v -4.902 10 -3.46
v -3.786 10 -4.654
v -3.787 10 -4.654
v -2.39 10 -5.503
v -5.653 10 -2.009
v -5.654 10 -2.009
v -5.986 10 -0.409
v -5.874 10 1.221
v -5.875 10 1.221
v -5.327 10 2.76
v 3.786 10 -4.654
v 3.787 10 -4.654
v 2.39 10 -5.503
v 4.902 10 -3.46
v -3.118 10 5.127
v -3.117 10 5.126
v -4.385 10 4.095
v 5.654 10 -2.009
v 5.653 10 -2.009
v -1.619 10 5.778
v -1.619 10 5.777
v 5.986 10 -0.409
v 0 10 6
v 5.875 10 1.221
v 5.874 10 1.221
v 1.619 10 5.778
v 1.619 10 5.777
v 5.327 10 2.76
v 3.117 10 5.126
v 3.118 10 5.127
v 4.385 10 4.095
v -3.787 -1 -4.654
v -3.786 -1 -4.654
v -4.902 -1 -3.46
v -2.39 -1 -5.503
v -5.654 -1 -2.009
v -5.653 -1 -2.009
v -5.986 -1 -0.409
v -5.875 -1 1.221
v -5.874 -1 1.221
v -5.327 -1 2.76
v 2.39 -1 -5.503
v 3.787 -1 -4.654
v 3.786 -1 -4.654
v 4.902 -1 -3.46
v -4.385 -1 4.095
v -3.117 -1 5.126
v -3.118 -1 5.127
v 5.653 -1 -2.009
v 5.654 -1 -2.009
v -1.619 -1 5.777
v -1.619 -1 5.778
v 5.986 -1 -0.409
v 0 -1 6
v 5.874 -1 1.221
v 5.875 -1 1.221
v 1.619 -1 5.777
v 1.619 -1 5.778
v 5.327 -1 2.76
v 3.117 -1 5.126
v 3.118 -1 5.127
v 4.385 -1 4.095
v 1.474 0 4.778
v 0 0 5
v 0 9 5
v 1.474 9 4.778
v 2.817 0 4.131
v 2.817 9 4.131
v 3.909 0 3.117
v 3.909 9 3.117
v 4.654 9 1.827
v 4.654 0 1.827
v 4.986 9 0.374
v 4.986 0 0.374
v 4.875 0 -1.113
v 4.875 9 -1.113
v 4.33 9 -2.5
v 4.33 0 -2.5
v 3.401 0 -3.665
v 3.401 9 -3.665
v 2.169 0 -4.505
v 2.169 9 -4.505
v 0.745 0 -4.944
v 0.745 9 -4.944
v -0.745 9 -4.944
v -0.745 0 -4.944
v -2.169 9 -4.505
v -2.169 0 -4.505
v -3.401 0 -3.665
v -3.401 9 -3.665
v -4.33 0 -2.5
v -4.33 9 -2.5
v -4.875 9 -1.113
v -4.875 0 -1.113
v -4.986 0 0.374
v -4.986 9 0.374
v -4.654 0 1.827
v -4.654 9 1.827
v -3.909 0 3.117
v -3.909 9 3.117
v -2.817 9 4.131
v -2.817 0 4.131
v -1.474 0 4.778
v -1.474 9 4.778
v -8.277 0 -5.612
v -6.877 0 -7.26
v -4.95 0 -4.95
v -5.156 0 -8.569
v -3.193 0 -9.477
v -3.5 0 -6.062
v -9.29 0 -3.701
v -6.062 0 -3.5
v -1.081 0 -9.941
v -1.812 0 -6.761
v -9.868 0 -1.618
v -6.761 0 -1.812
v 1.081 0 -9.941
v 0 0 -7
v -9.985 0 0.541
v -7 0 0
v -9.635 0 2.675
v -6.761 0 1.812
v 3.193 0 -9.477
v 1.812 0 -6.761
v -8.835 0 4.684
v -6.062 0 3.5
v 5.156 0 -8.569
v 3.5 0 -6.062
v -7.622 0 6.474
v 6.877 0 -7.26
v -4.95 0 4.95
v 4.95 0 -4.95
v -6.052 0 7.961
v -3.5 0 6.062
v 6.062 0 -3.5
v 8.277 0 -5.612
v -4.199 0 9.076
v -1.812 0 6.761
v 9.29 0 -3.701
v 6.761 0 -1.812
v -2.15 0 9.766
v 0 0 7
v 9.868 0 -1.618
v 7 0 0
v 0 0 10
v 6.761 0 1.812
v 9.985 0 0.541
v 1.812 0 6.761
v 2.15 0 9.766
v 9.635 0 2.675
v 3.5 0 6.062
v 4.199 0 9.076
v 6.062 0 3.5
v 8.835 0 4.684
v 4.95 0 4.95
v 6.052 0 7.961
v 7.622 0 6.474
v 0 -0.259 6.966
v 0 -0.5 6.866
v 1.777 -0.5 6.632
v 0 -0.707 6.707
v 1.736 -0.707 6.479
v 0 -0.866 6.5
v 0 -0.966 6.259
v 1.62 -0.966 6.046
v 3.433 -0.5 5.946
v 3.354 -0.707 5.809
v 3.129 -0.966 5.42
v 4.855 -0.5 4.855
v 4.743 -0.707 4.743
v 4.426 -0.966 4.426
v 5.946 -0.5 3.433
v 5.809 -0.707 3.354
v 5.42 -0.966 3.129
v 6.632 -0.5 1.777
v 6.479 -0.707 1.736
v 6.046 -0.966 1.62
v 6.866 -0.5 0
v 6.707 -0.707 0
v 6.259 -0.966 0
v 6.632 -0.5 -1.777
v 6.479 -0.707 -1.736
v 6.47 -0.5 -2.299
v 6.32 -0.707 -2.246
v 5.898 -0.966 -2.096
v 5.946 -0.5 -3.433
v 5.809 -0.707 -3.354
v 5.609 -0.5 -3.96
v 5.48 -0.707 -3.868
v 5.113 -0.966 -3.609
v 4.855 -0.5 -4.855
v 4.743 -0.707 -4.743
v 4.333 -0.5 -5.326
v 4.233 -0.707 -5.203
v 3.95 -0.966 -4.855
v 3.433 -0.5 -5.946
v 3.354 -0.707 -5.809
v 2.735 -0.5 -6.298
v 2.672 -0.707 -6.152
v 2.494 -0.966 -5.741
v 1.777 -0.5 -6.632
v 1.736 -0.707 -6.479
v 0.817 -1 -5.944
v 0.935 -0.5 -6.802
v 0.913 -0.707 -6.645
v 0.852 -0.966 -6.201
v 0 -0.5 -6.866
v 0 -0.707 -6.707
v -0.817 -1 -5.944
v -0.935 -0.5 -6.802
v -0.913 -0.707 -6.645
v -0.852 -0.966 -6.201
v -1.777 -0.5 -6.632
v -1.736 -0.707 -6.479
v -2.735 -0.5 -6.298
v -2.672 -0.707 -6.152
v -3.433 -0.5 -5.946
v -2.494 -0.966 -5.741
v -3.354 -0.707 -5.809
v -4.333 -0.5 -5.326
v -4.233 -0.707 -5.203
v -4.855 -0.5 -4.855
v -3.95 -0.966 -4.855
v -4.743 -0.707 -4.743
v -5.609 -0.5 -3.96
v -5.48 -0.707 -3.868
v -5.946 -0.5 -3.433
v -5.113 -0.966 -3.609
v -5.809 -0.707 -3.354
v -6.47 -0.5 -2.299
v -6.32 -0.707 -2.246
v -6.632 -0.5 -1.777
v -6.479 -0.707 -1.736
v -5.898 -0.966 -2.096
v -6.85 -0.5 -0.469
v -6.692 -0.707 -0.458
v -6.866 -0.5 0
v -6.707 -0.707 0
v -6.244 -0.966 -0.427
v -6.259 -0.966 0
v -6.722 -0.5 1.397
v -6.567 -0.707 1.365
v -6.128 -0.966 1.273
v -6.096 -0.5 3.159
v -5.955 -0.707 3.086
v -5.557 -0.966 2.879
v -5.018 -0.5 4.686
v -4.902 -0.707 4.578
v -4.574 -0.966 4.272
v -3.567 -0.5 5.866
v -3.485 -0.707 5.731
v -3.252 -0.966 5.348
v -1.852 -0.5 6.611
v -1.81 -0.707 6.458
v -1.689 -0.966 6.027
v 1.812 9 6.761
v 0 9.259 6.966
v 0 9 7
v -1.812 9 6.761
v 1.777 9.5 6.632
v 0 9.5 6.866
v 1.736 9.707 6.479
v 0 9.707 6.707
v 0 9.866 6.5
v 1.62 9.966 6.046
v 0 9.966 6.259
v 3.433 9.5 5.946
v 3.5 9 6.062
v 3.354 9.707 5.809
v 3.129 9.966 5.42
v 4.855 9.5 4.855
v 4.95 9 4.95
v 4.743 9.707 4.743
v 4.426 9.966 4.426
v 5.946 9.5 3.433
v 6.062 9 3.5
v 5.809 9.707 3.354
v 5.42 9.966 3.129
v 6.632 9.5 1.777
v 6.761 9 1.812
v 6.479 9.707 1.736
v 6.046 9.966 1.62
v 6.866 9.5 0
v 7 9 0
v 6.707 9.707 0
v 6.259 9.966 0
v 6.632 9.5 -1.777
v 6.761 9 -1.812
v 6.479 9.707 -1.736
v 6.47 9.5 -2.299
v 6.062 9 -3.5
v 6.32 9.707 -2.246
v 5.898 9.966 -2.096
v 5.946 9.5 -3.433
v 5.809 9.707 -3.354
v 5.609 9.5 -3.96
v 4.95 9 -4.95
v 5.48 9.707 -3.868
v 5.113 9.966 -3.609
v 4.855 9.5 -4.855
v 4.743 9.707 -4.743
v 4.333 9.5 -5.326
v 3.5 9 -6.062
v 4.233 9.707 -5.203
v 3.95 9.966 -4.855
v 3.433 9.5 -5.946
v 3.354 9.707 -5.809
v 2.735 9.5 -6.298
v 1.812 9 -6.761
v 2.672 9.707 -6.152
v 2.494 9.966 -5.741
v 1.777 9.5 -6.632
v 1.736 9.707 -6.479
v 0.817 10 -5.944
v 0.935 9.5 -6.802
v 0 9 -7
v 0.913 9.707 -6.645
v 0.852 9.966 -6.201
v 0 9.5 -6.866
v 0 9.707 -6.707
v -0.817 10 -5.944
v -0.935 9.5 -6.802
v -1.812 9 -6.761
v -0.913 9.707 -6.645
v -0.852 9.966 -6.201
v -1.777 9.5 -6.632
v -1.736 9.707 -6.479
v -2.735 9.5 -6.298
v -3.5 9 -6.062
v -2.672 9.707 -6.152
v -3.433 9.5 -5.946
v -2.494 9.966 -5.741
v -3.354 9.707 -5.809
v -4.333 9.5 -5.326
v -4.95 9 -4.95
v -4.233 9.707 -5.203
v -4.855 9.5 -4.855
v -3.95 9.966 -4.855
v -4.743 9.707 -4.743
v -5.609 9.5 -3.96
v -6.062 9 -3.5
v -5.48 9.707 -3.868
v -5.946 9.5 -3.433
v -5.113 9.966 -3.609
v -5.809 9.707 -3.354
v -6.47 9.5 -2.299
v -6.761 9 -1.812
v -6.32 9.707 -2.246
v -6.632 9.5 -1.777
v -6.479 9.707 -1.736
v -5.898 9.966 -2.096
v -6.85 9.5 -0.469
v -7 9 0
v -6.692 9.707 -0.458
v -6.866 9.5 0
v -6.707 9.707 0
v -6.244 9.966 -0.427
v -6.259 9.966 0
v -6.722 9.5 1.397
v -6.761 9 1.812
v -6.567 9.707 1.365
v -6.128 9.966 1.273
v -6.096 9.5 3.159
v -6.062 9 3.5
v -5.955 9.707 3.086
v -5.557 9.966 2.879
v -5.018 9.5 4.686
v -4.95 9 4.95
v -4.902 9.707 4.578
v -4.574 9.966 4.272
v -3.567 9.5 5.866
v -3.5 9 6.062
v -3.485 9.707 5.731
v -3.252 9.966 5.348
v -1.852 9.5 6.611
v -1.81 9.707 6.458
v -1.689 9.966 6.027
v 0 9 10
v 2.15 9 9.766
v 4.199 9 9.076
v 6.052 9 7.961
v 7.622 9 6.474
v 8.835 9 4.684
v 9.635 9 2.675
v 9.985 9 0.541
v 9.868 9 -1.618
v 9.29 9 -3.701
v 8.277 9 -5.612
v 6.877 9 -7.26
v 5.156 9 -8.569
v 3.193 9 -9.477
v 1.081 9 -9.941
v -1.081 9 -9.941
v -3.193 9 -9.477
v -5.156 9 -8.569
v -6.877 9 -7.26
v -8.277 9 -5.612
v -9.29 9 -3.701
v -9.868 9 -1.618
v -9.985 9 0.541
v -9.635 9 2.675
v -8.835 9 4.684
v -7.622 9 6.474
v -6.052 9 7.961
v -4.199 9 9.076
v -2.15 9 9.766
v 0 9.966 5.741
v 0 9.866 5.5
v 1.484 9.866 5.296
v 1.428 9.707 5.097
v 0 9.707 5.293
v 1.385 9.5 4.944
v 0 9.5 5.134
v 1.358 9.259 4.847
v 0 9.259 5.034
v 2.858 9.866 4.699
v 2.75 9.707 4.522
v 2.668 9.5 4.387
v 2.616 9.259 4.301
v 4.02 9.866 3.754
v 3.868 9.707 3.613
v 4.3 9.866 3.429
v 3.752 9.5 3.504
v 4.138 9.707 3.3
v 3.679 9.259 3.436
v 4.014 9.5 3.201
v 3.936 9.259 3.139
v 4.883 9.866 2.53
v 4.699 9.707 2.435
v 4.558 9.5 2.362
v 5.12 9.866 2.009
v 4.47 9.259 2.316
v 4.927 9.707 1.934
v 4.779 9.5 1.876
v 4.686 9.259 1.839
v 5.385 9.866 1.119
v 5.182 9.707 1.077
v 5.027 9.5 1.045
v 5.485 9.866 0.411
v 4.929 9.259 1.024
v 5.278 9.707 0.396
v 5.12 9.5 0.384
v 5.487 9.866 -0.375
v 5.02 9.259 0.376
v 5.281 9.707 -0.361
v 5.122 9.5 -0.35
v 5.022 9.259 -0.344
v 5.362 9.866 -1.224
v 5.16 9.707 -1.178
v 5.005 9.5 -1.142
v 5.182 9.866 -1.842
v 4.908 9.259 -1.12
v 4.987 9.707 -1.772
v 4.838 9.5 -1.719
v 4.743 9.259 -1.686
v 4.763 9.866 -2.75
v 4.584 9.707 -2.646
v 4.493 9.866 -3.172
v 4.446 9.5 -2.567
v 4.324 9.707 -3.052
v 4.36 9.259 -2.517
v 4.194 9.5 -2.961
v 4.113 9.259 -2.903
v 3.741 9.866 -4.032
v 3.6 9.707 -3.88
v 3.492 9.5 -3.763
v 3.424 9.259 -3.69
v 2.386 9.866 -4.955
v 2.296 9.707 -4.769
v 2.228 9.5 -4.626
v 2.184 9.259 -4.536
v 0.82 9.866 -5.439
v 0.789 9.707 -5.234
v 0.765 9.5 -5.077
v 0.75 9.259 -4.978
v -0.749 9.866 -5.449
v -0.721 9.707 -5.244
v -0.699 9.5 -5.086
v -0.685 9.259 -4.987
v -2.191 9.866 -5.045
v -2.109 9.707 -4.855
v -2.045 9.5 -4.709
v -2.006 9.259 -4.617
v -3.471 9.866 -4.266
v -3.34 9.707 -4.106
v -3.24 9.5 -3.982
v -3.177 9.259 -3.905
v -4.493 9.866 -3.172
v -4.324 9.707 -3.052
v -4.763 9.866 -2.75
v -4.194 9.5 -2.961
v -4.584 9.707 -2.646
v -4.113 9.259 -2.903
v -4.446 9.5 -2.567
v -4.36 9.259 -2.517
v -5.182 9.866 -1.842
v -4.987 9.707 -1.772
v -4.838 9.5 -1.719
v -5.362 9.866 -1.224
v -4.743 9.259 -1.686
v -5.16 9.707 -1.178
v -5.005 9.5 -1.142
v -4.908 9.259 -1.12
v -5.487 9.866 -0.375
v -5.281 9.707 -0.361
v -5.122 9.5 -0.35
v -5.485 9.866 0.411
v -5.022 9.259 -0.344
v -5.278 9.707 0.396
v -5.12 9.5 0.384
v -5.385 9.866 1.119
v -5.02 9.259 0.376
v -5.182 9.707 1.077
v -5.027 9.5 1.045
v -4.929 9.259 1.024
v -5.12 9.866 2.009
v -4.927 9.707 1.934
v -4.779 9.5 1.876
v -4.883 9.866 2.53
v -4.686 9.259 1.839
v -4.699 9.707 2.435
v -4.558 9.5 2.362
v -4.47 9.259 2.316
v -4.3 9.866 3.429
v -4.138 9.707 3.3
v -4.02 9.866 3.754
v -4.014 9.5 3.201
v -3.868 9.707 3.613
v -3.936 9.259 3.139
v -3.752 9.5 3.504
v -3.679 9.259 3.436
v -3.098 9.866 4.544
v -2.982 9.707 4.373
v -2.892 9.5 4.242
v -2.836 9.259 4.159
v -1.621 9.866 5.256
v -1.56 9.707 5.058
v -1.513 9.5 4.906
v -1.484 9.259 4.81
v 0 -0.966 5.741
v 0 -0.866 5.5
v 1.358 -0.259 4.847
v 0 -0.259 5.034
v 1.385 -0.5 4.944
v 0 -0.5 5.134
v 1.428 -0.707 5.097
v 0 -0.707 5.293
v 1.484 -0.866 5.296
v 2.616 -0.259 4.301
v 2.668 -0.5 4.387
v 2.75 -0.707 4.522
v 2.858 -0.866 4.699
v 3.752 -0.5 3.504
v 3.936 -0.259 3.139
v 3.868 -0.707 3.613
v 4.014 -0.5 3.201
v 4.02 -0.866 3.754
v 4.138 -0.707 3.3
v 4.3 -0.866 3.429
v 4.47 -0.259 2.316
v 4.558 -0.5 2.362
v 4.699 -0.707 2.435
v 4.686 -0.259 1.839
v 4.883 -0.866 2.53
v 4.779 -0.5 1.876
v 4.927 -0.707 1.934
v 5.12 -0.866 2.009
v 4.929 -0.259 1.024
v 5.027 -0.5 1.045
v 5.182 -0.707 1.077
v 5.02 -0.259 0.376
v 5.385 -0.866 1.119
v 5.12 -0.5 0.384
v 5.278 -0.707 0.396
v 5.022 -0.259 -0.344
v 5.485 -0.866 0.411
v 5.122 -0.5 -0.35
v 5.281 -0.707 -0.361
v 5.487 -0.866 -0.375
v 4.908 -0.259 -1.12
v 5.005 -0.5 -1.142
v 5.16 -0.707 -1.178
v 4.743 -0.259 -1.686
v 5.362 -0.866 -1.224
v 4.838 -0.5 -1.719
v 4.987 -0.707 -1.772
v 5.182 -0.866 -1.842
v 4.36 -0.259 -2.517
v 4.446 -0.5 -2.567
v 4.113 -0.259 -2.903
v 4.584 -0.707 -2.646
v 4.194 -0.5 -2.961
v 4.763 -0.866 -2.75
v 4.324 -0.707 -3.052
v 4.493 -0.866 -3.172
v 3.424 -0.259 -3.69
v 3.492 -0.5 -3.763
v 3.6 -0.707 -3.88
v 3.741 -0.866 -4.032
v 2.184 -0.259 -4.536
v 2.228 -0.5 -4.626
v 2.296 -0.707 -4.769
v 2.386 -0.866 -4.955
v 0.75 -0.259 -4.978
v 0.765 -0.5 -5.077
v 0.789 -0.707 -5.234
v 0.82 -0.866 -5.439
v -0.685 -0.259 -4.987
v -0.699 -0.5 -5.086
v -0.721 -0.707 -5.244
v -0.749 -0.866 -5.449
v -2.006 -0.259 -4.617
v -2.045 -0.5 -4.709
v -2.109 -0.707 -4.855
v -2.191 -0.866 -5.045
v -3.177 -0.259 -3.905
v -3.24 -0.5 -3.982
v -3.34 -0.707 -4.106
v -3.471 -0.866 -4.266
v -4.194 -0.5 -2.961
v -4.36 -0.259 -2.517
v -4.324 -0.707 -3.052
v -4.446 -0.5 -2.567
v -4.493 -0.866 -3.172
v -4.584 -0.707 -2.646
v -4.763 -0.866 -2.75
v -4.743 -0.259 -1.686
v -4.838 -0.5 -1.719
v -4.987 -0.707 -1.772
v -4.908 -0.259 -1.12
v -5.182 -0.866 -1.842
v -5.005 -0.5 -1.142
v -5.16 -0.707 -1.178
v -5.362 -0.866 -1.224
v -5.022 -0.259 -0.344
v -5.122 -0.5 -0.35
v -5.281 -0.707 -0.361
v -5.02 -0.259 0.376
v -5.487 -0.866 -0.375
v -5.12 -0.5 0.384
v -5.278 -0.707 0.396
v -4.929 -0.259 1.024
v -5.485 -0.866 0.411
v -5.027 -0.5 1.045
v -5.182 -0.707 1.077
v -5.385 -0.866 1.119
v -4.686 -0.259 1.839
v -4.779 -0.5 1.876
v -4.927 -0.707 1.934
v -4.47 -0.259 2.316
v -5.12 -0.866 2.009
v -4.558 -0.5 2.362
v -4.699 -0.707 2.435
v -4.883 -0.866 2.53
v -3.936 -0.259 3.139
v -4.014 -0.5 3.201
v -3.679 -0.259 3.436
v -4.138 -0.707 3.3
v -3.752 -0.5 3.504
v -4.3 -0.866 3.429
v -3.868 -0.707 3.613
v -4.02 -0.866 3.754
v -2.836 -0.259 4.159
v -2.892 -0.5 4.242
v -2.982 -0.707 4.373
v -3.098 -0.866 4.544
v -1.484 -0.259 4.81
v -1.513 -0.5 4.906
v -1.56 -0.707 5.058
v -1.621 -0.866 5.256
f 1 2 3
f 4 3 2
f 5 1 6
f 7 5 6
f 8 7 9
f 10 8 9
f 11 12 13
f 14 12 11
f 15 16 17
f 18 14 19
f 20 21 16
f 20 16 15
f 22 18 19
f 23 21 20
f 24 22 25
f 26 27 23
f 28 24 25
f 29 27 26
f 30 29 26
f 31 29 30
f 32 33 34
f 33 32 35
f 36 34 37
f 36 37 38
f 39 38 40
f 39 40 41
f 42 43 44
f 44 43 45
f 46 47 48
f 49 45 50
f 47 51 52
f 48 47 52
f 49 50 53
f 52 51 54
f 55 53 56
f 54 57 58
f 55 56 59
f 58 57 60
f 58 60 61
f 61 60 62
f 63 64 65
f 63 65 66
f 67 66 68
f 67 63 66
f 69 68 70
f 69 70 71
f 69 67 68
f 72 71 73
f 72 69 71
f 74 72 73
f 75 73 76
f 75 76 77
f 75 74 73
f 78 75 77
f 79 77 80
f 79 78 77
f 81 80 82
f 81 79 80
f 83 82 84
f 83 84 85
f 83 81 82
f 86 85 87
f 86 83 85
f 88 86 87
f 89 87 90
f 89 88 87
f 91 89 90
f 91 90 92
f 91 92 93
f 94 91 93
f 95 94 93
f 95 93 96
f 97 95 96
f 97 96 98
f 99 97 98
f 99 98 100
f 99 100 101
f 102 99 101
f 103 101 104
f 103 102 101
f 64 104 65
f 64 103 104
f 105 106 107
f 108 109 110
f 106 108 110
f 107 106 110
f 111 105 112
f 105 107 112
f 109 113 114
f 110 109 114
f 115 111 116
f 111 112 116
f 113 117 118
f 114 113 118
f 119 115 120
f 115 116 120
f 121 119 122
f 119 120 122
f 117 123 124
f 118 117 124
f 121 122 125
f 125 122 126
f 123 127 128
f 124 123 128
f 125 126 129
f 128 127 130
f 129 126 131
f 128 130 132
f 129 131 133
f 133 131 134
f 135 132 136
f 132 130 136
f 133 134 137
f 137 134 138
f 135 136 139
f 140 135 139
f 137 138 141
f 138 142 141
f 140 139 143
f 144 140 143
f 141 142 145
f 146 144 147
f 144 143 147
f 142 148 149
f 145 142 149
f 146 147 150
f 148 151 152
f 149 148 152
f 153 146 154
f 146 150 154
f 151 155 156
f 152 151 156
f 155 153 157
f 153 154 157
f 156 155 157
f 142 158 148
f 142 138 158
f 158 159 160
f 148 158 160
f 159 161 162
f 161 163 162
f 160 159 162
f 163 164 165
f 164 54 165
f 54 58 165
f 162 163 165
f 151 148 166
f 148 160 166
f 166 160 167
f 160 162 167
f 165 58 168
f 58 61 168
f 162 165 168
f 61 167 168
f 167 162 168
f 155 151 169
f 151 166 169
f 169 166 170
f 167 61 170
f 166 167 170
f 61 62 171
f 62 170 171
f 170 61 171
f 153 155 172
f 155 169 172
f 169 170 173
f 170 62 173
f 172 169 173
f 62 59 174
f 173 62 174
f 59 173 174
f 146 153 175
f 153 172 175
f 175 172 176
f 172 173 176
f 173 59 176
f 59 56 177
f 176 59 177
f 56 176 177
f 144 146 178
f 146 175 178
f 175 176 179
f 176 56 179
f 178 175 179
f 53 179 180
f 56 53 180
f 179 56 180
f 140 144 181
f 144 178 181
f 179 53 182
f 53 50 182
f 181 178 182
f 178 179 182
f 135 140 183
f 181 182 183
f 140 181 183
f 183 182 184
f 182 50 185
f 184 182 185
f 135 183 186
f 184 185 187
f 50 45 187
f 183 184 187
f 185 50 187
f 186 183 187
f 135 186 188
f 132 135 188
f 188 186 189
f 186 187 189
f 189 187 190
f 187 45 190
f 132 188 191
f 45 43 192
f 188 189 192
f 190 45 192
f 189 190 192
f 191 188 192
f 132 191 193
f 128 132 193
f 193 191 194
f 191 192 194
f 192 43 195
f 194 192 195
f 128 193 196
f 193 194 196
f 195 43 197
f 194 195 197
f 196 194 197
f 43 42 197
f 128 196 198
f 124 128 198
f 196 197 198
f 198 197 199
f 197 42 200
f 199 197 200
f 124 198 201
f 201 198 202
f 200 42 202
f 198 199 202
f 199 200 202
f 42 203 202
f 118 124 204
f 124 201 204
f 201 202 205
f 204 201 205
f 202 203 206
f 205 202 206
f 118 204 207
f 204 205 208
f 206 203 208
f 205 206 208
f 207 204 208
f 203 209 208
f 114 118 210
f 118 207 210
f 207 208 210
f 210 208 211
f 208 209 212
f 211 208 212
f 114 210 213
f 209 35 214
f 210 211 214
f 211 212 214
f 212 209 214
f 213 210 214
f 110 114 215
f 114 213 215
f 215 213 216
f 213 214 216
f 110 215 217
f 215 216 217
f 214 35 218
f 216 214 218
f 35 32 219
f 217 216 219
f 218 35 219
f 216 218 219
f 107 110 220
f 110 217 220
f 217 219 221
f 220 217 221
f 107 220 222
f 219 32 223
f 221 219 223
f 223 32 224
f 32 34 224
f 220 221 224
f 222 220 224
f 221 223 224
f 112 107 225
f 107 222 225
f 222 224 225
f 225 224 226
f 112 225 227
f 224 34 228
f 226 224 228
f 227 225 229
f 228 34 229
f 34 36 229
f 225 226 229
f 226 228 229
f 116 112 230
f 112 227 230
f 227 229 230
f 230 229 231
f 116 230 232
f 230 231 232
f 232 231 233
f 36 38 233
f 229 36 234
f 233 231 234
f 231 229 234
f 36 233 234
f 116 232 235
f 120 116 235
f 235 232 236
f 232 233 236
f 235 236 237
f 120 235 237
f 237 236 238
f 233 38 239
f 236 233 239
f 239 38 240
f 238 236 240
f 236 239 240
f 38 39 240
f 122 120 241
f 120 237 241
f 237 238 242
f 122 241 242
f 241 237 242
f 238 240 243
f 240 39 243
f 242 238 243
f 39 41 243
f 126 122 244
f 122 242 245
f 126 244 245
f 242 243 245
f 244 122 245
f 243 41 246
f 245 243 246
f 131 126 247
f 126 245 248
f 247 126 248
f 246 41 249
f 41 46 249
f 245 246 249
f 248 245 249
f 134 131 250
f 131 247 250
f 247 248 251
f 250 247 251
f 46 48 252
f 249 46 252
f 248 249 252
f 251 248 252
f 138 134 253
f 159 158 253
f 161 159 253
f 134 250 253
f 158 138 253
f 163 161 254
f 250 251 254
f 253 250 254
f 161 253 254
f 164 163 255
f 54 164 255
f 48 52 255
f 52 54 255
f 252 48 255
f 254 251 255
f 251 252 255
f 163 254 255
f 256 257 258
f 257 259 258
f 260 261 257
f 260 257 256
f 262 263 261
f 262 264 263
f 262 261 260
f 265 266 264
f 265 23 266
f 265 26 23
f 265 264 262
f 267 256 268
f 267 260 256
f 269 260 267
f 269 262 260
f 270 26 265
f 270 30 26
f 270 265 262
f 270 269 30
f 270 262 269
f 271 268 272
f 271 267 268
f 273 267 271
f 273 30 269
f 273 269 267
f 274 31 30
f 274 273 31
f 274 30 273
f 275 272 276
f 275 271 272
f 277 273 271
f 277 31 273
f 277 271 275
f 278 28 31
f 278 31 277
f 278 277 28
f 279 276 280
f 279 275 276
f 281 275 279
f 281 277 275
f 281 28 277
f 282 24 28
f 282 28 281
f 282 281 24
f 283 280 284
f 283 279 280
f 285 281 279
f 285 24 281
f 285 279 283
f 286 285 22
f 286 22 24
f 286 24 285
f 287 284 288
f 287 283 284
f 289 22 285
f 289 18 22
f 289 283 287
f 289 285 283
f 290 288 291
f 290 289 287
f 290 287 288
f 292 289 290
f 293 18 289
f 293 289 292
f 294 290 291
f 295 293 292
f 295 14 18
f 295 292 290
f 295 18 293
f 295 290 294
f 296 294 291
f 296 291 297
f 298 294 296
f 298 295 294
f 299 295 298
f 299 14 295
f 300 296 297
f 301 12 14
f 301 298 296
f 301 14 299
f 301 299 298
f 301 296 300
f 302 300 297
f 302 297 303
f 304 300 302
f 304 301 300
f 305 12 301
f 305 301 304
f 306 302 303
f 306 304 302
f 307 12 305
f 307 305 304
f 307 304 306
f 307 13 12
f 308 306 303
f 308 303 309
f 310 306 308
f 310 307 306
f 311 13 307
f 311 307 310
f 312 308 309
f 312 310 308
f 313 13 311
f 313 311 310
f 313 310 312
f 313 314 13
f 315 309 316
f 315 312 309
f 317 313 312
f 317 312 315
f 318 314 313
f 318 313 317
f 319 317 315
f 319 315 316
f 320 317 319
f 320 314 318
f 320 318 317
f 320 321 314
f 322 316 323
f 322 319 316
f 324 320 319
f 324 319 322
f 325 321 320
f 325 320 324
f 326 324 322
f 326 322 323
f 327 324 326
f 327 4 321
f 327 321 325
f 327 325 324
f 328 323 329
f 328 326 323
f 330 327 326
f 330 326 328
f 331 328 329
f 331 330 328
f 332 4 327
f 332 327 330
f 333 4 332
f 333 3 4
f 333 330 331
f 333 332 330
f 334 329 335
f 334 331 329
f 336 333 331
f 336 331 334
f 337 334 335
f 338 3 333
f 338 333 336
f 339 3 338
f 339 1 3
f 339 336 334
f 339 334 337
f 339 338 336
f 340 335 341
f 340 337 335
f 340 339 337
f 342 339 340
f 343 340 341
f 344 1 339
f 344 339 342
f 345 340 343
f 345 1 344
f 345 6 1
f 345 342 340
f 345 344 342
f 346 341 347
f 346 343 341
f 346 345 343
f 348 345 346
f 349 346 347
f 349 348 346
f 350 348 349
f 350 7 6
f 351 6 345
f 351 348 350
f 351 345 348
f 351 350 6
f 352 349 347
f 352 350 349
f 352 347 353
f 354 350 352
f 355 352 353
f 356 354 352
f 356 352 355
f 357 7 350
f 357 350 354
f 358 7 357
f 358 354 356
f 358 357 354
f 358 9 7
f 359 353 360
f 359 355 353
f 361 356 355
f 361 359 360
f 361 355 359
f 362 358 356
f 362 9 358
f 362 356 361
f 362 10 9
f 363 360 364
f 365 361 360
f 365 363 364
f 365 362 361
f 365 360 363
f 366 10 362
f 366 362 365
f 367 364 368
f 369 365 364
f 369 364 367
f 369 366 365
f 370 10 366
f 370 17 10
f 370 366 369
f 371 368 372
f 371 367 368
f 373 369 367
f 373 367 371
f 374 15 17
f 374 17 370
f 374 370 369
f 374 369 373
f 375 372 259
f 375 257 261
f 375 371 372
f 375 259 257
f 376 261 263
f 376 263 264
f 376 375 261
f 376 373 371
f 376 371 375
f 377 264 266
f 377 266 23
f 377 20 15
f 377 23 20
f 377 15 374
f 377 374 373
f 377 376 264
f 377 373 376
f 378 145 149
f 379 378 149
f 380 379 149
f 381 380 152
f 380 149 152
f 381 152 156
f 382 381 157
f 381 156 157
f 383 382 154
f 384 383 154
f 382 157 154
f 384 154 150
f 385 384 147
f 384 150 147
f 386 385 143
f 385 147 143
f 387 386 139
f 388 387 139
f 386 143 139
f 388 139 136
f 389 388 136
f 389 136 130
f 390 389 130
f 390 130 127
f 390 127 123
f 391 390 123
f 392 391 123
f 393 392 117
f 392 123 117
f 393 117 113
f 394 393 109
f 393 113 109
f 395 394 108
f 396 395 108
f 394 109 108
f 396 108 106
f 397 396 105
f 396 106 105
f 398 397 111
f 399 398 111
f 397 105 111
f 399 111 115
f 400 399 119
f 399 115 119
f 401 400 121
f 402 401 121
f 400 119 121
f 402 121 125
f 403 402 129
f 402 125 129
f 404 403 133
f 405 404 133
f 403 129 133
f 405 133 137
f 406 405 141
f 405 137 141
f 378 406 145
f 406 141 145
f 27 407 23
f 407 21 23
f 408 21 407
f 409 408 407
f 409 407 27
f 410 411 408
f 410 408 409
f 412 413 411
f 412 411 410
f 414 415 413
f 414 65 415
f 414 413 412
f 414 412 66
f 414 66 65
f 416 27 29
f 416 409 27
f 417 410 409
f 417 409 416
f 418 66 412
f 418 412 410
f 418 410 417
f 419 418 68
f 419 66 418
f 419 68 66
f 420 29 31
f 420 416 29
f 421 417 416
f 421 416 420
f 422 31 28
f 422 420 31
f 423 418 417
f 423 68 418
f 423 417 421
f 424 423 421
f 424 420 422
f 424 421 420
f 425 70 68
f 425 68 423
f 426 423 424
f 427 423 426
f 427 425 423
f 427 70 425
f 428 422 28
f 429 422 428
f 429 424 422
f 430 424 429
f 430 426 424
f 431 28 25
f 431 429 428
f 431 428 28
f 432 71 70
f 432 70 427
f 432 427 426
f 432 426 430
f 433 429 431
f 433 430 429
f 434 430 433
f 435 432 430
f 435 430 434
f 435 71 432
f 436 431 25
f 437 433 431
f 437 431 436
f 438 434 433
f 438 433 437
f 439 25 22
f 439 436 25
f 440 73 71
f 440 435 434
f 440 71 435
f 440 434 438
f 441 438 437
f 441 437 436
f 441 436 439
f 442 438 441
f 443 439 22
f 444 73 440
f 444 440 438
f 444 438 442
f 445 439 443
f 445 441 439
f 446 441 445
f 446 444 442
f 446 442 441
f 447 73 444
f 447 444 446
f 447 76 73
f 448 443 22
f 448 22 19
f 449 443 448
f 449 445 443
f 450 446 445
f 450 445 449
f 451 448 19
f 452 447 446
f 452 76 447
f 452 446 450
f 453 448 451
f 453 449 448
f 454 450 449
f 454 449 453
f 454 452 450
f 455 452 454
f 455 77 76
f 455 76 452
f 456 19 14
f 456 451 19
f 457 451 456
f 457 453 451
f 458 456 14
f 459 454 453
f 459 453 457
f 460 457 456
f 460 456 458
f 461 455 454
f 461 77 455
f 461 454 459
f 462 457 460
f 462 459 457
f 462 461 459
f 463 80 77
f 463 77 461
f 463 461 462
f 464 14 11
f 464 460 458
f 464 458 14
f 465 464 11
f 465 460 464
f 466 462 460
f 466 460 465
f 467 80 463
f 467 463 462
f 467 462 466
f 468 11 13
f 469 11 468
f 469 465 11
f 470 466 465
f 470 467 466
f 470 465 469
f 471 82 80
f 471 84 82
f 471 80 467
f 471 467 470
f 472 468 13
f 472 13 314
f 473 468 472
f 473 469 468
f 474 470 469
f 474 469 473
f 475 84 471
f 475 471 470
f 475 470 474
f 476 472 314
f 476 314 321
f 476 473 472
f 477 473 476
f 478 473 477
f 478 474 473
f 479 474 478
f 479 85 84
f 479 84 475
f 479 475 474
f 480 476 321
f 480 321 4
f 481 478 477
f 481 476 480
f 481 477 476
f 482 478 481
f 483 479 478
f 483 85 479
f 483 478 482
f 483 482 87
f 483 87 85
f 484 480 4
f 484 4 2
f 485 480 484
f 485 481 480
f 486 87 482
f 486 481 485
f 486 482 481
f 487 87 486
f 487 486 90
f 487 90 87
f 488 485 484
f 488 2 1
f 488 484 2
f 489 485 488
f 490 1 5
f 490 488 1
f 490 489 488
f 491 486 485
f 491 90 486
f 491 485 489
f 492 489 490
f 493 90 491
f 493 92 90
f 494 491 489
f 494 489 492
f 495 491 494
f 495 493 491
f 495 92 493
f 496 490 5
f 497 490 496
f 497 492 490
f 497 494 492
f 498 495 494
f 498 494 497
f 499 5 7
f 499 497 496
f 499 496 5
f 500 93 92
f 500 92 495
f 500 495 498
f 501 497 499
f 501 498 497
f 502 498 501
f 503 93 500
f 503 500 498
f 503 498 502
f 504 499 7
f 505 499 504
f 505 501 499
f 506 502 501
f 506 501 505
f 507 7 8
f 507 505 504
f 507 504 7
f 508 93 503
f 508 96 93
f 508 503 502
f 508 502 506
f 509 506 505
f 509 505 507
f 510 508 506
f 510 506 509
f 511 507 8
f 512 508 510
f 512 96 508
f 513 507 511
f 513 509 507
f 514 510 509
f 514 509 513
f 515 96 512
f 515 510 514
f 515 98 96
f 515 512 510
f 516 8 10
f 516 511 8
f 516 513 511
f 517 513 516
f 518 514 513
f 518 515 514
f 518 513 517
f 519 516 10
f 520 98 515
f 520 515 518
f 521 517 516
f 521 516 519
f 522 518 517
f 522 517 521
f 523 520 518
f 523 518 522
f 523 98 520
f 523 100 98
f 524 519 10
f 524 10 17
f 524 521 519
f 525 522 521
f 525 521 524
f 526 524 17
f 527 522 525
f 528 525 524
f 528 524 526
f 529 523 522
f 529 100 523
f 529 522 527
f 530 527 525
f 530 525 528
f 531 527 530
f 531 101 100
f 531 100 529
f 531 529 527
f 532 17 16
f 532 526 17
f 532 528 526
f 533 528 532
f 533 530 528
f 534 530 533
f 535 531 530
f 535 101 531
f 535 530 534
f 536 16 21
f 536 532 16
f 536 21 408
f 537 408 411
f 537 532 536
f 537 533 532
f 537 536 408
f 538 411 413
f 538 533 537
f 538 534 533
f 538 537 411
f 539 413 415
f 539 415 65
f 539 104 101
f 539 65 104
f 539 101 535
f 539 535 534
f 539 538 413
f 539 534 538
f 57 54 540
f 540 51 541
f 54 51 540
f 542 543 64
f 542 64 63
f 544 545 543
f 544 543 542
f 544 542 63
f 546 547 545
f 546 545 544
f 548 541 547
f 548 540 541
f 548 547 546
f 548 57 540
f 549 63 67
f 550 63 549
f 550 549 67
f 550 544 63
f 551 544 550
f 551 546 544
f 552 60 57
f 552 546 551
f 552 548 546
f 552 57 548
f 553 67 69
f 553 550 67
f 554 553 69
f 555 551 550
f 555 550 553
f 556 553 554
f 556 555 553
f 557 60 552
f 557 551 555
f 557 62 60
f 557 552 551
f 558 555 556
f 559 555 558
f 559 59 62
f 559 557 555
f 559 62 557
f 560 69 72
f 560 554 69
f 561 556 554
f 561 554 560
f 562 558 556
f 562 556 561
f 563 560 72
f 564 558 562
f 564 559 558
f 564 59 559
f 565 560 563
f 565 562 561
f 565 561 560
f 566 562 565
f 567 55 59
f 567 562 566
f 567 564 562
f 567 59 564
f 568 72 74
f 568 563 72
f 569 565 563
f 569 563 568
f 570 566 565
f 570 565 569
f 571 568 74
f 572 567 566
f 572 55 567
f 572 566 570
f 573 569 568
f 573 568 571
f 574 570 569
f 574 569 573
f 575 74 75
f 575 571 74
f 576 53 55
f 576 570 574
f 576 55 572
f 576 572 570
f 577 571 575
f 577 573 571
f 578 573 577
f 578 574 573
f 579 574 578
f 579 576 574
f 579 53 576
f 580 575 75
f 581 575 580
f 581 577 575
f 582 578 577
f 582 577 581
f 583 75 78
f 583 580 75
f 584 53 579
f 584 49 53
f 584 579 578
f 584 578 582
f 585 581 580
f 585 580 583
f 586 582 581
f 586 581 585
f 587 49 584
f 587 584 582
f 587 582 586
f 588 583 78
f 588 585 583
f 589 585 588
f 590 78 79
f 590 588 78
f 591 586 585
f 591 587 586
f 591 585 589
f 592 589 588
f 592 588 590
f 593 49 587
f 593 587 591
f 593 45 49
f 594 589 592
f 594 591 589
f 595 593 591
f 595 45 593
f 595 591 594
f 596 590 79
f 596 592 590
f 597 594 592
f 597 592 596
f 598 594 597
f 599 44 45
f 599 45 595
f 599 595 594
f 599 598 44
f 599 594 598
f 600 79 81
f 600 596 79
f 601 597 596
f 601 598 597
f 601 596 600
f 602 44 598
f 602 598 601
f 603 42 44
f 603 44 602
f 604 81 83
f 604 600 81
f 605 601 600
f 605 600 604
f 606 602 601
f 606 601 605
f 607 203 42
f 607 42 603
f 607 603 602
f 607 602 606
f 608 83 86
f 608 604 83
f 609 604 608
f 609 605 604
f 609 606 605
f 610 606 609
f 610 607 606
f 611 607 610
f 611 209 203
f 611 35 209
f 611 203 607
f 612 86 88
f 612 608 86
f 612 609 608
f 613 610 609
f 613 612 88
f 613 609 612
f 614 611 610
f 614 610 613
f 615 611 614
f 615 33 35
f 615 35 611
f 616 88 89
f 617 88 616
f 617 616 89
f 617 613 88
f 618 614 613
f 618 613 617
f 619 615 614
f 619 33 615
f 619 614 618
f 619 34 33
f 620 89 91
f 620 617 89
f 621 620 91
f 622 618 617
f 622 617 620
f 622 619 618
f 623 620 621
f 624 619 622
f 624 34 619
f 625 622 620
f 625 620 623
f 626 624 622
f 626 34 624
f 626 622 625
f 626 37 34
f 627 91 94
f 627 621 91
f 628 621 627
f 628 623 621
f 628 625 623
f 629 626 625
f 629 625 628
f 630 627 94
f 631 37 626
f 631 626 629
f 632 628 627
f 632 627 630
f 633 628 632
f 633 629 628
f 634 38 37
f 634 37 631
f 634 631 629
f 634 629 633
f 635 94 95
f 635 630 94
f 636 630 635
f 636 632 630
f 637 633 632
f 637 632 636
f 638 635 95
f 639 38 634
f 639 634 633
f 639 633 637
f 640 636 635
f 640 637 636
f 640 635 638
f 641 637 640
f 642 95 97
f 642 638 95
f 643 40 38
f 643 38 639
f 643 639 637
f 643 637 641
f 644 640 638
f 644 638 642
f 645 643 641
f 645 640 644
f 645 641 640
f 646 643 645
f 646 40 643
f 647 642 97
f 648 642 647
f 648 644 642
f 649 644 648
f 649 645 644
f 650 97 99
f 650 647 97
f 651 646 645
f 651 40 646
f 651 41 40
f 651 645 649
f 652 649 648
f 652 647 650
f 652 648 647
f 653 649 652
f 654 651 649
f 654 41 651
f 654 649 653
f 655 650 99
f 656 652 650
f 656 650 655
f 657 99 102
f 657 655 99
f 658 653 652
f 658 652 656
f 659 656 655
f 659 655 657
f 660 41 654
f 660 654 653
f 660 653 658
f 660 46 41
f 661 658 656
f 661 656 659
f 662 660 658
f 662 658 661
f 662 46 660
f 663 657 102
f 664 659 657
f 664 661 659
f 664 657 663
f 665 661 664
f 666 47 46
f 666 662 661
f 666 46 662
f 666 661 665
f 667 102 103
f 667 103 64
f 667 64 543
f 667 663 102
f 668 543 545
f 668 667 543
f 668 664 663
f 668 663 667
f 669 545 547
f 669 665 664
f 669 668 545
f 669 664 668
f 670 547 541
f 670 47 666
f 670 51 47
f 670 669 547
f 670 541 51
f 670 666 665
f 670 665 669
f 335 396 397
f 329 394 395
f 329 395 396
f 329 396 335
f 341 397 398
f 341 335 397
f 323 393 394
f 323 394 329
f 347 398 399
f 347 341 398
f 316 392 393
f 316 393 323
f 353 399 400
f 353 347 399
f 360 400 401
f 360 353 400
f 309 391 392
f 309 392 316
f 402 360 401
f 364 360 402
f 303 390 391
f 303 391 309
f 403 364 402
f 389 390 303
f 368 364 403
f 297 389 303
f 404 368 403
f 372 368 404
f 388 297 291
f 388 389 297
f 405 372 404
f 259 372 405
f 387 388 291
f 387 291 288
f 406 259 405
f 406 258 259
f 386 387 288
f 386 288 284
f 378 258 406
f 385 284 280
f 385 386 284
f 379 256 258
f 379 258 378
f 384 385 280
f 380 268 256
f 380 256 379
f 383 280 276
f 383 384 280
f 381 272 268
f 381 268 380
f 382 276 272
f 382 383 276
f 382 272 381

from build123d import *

# Parameters (mm, degrees)
PROFILE_SKETCH_R              = 10
PROFILE_SKETCH_R_2            = 5
CYLINDER_EXTRUDE_DEPTH        = 9
LIP_RING_SKETCH_R             = 7
LIP_RING_SKETCH_R_2           = 5
BOTTOM_LIP_RING_EXTRUDE_DEPTH = 1
BOTTOM_RING_FILLET_R          = 1
TOP_START                     = -10
SKETCH2_2_R                   = 7
SKETCH2_2_R_2                 = 5
TOP_LIP_RING_EXTRUDE_DEPTH    = 1
TOP_RING_FILLET_R             = 1


with BuildPart() as part:
    # Profile Sketch → Cylinder Extrude (new body)
    with BuildSketch(Plane(origin=(0, 0, 0), x_dir=(1, 0, 0), z_dir=(0, 1, 0))):
        with Locations(Location((0, 0, 0), (0, 0, 270))):
            Circle(PROFILE_SKETCH_R)
        with Locations(Location((0, 0, 0), (0, 0, 270))):
            Circle(PROFILE_SKETCH_R_2, mode=Mode.SUBTRACT)
    extrude(amount=CYLINDER_EXTRUDE_DEPTH)

    # Lip Ring Sketch → Bottom Lip Ring Extrude (add)
    with BuildSketch(Plane(origin=(0, 9, 0), x_dir=(1, 0, 0), z_dir=(0, 1, 0))):
        with Locations(Location((0, 0, 0), (0, 0, 270))):
            Circle(LIP_RING_SKETCH_R)
        with Locations(Location((0, 0, 0), (0, 0, 270))):
            Circle(LIP_RING_SKETCH_R_2, mode=Mode.SUBTRACT)
    extrude(amount=BOTTOM_LIP_RING_EXTRUDE_DEPTH)

    # Bottom Ring Fillet
    bottom_ring_fillet_edges = [part.edges().sort_by_distance(p)[0] for p in [
        (0, 10, -7),
        (0, 10, -5),
    ]]
    fillet(bottom_ring_fillet_edges, radius=BOTTOM_RING_FILLET_R - 0.0001)  # a hair under: the kernel refuses the full size

    # Sketch2<2> → Top Lip Ring Extrude (add)
    with BuildSketch(Plane(origin=(0, 9, 0), x_dir=(1, 0, 0), z_dir=(0, 1, 0)).offset(TOP_START)):
        with Locations(Location((0, 0, 0), (0, 0, 270))):
            Circle(SKETCH2_2_R)
        with Locations(Location((0, 0, 0), (0, 0, 270))):
            Circle(SKETCH2_2_R_2, mode=Mode.SUBTRACT)
    extrude(amount=TOP_LIP_RING_EXTRUDE_DEPTH)

    # Top Ring Fillet
    top_ring_fillet_edges = [part.edges().sort_by_distance(p)[0] for p in [
        (0, -1, -7),
        (0, -1, -5),
    ]]
    fillet(top_ring_fillet_edges, radius=TOP_RING_FILLET_R - 0.0001)  # a hair under: the kernel refuses the full size


solid = part.part
